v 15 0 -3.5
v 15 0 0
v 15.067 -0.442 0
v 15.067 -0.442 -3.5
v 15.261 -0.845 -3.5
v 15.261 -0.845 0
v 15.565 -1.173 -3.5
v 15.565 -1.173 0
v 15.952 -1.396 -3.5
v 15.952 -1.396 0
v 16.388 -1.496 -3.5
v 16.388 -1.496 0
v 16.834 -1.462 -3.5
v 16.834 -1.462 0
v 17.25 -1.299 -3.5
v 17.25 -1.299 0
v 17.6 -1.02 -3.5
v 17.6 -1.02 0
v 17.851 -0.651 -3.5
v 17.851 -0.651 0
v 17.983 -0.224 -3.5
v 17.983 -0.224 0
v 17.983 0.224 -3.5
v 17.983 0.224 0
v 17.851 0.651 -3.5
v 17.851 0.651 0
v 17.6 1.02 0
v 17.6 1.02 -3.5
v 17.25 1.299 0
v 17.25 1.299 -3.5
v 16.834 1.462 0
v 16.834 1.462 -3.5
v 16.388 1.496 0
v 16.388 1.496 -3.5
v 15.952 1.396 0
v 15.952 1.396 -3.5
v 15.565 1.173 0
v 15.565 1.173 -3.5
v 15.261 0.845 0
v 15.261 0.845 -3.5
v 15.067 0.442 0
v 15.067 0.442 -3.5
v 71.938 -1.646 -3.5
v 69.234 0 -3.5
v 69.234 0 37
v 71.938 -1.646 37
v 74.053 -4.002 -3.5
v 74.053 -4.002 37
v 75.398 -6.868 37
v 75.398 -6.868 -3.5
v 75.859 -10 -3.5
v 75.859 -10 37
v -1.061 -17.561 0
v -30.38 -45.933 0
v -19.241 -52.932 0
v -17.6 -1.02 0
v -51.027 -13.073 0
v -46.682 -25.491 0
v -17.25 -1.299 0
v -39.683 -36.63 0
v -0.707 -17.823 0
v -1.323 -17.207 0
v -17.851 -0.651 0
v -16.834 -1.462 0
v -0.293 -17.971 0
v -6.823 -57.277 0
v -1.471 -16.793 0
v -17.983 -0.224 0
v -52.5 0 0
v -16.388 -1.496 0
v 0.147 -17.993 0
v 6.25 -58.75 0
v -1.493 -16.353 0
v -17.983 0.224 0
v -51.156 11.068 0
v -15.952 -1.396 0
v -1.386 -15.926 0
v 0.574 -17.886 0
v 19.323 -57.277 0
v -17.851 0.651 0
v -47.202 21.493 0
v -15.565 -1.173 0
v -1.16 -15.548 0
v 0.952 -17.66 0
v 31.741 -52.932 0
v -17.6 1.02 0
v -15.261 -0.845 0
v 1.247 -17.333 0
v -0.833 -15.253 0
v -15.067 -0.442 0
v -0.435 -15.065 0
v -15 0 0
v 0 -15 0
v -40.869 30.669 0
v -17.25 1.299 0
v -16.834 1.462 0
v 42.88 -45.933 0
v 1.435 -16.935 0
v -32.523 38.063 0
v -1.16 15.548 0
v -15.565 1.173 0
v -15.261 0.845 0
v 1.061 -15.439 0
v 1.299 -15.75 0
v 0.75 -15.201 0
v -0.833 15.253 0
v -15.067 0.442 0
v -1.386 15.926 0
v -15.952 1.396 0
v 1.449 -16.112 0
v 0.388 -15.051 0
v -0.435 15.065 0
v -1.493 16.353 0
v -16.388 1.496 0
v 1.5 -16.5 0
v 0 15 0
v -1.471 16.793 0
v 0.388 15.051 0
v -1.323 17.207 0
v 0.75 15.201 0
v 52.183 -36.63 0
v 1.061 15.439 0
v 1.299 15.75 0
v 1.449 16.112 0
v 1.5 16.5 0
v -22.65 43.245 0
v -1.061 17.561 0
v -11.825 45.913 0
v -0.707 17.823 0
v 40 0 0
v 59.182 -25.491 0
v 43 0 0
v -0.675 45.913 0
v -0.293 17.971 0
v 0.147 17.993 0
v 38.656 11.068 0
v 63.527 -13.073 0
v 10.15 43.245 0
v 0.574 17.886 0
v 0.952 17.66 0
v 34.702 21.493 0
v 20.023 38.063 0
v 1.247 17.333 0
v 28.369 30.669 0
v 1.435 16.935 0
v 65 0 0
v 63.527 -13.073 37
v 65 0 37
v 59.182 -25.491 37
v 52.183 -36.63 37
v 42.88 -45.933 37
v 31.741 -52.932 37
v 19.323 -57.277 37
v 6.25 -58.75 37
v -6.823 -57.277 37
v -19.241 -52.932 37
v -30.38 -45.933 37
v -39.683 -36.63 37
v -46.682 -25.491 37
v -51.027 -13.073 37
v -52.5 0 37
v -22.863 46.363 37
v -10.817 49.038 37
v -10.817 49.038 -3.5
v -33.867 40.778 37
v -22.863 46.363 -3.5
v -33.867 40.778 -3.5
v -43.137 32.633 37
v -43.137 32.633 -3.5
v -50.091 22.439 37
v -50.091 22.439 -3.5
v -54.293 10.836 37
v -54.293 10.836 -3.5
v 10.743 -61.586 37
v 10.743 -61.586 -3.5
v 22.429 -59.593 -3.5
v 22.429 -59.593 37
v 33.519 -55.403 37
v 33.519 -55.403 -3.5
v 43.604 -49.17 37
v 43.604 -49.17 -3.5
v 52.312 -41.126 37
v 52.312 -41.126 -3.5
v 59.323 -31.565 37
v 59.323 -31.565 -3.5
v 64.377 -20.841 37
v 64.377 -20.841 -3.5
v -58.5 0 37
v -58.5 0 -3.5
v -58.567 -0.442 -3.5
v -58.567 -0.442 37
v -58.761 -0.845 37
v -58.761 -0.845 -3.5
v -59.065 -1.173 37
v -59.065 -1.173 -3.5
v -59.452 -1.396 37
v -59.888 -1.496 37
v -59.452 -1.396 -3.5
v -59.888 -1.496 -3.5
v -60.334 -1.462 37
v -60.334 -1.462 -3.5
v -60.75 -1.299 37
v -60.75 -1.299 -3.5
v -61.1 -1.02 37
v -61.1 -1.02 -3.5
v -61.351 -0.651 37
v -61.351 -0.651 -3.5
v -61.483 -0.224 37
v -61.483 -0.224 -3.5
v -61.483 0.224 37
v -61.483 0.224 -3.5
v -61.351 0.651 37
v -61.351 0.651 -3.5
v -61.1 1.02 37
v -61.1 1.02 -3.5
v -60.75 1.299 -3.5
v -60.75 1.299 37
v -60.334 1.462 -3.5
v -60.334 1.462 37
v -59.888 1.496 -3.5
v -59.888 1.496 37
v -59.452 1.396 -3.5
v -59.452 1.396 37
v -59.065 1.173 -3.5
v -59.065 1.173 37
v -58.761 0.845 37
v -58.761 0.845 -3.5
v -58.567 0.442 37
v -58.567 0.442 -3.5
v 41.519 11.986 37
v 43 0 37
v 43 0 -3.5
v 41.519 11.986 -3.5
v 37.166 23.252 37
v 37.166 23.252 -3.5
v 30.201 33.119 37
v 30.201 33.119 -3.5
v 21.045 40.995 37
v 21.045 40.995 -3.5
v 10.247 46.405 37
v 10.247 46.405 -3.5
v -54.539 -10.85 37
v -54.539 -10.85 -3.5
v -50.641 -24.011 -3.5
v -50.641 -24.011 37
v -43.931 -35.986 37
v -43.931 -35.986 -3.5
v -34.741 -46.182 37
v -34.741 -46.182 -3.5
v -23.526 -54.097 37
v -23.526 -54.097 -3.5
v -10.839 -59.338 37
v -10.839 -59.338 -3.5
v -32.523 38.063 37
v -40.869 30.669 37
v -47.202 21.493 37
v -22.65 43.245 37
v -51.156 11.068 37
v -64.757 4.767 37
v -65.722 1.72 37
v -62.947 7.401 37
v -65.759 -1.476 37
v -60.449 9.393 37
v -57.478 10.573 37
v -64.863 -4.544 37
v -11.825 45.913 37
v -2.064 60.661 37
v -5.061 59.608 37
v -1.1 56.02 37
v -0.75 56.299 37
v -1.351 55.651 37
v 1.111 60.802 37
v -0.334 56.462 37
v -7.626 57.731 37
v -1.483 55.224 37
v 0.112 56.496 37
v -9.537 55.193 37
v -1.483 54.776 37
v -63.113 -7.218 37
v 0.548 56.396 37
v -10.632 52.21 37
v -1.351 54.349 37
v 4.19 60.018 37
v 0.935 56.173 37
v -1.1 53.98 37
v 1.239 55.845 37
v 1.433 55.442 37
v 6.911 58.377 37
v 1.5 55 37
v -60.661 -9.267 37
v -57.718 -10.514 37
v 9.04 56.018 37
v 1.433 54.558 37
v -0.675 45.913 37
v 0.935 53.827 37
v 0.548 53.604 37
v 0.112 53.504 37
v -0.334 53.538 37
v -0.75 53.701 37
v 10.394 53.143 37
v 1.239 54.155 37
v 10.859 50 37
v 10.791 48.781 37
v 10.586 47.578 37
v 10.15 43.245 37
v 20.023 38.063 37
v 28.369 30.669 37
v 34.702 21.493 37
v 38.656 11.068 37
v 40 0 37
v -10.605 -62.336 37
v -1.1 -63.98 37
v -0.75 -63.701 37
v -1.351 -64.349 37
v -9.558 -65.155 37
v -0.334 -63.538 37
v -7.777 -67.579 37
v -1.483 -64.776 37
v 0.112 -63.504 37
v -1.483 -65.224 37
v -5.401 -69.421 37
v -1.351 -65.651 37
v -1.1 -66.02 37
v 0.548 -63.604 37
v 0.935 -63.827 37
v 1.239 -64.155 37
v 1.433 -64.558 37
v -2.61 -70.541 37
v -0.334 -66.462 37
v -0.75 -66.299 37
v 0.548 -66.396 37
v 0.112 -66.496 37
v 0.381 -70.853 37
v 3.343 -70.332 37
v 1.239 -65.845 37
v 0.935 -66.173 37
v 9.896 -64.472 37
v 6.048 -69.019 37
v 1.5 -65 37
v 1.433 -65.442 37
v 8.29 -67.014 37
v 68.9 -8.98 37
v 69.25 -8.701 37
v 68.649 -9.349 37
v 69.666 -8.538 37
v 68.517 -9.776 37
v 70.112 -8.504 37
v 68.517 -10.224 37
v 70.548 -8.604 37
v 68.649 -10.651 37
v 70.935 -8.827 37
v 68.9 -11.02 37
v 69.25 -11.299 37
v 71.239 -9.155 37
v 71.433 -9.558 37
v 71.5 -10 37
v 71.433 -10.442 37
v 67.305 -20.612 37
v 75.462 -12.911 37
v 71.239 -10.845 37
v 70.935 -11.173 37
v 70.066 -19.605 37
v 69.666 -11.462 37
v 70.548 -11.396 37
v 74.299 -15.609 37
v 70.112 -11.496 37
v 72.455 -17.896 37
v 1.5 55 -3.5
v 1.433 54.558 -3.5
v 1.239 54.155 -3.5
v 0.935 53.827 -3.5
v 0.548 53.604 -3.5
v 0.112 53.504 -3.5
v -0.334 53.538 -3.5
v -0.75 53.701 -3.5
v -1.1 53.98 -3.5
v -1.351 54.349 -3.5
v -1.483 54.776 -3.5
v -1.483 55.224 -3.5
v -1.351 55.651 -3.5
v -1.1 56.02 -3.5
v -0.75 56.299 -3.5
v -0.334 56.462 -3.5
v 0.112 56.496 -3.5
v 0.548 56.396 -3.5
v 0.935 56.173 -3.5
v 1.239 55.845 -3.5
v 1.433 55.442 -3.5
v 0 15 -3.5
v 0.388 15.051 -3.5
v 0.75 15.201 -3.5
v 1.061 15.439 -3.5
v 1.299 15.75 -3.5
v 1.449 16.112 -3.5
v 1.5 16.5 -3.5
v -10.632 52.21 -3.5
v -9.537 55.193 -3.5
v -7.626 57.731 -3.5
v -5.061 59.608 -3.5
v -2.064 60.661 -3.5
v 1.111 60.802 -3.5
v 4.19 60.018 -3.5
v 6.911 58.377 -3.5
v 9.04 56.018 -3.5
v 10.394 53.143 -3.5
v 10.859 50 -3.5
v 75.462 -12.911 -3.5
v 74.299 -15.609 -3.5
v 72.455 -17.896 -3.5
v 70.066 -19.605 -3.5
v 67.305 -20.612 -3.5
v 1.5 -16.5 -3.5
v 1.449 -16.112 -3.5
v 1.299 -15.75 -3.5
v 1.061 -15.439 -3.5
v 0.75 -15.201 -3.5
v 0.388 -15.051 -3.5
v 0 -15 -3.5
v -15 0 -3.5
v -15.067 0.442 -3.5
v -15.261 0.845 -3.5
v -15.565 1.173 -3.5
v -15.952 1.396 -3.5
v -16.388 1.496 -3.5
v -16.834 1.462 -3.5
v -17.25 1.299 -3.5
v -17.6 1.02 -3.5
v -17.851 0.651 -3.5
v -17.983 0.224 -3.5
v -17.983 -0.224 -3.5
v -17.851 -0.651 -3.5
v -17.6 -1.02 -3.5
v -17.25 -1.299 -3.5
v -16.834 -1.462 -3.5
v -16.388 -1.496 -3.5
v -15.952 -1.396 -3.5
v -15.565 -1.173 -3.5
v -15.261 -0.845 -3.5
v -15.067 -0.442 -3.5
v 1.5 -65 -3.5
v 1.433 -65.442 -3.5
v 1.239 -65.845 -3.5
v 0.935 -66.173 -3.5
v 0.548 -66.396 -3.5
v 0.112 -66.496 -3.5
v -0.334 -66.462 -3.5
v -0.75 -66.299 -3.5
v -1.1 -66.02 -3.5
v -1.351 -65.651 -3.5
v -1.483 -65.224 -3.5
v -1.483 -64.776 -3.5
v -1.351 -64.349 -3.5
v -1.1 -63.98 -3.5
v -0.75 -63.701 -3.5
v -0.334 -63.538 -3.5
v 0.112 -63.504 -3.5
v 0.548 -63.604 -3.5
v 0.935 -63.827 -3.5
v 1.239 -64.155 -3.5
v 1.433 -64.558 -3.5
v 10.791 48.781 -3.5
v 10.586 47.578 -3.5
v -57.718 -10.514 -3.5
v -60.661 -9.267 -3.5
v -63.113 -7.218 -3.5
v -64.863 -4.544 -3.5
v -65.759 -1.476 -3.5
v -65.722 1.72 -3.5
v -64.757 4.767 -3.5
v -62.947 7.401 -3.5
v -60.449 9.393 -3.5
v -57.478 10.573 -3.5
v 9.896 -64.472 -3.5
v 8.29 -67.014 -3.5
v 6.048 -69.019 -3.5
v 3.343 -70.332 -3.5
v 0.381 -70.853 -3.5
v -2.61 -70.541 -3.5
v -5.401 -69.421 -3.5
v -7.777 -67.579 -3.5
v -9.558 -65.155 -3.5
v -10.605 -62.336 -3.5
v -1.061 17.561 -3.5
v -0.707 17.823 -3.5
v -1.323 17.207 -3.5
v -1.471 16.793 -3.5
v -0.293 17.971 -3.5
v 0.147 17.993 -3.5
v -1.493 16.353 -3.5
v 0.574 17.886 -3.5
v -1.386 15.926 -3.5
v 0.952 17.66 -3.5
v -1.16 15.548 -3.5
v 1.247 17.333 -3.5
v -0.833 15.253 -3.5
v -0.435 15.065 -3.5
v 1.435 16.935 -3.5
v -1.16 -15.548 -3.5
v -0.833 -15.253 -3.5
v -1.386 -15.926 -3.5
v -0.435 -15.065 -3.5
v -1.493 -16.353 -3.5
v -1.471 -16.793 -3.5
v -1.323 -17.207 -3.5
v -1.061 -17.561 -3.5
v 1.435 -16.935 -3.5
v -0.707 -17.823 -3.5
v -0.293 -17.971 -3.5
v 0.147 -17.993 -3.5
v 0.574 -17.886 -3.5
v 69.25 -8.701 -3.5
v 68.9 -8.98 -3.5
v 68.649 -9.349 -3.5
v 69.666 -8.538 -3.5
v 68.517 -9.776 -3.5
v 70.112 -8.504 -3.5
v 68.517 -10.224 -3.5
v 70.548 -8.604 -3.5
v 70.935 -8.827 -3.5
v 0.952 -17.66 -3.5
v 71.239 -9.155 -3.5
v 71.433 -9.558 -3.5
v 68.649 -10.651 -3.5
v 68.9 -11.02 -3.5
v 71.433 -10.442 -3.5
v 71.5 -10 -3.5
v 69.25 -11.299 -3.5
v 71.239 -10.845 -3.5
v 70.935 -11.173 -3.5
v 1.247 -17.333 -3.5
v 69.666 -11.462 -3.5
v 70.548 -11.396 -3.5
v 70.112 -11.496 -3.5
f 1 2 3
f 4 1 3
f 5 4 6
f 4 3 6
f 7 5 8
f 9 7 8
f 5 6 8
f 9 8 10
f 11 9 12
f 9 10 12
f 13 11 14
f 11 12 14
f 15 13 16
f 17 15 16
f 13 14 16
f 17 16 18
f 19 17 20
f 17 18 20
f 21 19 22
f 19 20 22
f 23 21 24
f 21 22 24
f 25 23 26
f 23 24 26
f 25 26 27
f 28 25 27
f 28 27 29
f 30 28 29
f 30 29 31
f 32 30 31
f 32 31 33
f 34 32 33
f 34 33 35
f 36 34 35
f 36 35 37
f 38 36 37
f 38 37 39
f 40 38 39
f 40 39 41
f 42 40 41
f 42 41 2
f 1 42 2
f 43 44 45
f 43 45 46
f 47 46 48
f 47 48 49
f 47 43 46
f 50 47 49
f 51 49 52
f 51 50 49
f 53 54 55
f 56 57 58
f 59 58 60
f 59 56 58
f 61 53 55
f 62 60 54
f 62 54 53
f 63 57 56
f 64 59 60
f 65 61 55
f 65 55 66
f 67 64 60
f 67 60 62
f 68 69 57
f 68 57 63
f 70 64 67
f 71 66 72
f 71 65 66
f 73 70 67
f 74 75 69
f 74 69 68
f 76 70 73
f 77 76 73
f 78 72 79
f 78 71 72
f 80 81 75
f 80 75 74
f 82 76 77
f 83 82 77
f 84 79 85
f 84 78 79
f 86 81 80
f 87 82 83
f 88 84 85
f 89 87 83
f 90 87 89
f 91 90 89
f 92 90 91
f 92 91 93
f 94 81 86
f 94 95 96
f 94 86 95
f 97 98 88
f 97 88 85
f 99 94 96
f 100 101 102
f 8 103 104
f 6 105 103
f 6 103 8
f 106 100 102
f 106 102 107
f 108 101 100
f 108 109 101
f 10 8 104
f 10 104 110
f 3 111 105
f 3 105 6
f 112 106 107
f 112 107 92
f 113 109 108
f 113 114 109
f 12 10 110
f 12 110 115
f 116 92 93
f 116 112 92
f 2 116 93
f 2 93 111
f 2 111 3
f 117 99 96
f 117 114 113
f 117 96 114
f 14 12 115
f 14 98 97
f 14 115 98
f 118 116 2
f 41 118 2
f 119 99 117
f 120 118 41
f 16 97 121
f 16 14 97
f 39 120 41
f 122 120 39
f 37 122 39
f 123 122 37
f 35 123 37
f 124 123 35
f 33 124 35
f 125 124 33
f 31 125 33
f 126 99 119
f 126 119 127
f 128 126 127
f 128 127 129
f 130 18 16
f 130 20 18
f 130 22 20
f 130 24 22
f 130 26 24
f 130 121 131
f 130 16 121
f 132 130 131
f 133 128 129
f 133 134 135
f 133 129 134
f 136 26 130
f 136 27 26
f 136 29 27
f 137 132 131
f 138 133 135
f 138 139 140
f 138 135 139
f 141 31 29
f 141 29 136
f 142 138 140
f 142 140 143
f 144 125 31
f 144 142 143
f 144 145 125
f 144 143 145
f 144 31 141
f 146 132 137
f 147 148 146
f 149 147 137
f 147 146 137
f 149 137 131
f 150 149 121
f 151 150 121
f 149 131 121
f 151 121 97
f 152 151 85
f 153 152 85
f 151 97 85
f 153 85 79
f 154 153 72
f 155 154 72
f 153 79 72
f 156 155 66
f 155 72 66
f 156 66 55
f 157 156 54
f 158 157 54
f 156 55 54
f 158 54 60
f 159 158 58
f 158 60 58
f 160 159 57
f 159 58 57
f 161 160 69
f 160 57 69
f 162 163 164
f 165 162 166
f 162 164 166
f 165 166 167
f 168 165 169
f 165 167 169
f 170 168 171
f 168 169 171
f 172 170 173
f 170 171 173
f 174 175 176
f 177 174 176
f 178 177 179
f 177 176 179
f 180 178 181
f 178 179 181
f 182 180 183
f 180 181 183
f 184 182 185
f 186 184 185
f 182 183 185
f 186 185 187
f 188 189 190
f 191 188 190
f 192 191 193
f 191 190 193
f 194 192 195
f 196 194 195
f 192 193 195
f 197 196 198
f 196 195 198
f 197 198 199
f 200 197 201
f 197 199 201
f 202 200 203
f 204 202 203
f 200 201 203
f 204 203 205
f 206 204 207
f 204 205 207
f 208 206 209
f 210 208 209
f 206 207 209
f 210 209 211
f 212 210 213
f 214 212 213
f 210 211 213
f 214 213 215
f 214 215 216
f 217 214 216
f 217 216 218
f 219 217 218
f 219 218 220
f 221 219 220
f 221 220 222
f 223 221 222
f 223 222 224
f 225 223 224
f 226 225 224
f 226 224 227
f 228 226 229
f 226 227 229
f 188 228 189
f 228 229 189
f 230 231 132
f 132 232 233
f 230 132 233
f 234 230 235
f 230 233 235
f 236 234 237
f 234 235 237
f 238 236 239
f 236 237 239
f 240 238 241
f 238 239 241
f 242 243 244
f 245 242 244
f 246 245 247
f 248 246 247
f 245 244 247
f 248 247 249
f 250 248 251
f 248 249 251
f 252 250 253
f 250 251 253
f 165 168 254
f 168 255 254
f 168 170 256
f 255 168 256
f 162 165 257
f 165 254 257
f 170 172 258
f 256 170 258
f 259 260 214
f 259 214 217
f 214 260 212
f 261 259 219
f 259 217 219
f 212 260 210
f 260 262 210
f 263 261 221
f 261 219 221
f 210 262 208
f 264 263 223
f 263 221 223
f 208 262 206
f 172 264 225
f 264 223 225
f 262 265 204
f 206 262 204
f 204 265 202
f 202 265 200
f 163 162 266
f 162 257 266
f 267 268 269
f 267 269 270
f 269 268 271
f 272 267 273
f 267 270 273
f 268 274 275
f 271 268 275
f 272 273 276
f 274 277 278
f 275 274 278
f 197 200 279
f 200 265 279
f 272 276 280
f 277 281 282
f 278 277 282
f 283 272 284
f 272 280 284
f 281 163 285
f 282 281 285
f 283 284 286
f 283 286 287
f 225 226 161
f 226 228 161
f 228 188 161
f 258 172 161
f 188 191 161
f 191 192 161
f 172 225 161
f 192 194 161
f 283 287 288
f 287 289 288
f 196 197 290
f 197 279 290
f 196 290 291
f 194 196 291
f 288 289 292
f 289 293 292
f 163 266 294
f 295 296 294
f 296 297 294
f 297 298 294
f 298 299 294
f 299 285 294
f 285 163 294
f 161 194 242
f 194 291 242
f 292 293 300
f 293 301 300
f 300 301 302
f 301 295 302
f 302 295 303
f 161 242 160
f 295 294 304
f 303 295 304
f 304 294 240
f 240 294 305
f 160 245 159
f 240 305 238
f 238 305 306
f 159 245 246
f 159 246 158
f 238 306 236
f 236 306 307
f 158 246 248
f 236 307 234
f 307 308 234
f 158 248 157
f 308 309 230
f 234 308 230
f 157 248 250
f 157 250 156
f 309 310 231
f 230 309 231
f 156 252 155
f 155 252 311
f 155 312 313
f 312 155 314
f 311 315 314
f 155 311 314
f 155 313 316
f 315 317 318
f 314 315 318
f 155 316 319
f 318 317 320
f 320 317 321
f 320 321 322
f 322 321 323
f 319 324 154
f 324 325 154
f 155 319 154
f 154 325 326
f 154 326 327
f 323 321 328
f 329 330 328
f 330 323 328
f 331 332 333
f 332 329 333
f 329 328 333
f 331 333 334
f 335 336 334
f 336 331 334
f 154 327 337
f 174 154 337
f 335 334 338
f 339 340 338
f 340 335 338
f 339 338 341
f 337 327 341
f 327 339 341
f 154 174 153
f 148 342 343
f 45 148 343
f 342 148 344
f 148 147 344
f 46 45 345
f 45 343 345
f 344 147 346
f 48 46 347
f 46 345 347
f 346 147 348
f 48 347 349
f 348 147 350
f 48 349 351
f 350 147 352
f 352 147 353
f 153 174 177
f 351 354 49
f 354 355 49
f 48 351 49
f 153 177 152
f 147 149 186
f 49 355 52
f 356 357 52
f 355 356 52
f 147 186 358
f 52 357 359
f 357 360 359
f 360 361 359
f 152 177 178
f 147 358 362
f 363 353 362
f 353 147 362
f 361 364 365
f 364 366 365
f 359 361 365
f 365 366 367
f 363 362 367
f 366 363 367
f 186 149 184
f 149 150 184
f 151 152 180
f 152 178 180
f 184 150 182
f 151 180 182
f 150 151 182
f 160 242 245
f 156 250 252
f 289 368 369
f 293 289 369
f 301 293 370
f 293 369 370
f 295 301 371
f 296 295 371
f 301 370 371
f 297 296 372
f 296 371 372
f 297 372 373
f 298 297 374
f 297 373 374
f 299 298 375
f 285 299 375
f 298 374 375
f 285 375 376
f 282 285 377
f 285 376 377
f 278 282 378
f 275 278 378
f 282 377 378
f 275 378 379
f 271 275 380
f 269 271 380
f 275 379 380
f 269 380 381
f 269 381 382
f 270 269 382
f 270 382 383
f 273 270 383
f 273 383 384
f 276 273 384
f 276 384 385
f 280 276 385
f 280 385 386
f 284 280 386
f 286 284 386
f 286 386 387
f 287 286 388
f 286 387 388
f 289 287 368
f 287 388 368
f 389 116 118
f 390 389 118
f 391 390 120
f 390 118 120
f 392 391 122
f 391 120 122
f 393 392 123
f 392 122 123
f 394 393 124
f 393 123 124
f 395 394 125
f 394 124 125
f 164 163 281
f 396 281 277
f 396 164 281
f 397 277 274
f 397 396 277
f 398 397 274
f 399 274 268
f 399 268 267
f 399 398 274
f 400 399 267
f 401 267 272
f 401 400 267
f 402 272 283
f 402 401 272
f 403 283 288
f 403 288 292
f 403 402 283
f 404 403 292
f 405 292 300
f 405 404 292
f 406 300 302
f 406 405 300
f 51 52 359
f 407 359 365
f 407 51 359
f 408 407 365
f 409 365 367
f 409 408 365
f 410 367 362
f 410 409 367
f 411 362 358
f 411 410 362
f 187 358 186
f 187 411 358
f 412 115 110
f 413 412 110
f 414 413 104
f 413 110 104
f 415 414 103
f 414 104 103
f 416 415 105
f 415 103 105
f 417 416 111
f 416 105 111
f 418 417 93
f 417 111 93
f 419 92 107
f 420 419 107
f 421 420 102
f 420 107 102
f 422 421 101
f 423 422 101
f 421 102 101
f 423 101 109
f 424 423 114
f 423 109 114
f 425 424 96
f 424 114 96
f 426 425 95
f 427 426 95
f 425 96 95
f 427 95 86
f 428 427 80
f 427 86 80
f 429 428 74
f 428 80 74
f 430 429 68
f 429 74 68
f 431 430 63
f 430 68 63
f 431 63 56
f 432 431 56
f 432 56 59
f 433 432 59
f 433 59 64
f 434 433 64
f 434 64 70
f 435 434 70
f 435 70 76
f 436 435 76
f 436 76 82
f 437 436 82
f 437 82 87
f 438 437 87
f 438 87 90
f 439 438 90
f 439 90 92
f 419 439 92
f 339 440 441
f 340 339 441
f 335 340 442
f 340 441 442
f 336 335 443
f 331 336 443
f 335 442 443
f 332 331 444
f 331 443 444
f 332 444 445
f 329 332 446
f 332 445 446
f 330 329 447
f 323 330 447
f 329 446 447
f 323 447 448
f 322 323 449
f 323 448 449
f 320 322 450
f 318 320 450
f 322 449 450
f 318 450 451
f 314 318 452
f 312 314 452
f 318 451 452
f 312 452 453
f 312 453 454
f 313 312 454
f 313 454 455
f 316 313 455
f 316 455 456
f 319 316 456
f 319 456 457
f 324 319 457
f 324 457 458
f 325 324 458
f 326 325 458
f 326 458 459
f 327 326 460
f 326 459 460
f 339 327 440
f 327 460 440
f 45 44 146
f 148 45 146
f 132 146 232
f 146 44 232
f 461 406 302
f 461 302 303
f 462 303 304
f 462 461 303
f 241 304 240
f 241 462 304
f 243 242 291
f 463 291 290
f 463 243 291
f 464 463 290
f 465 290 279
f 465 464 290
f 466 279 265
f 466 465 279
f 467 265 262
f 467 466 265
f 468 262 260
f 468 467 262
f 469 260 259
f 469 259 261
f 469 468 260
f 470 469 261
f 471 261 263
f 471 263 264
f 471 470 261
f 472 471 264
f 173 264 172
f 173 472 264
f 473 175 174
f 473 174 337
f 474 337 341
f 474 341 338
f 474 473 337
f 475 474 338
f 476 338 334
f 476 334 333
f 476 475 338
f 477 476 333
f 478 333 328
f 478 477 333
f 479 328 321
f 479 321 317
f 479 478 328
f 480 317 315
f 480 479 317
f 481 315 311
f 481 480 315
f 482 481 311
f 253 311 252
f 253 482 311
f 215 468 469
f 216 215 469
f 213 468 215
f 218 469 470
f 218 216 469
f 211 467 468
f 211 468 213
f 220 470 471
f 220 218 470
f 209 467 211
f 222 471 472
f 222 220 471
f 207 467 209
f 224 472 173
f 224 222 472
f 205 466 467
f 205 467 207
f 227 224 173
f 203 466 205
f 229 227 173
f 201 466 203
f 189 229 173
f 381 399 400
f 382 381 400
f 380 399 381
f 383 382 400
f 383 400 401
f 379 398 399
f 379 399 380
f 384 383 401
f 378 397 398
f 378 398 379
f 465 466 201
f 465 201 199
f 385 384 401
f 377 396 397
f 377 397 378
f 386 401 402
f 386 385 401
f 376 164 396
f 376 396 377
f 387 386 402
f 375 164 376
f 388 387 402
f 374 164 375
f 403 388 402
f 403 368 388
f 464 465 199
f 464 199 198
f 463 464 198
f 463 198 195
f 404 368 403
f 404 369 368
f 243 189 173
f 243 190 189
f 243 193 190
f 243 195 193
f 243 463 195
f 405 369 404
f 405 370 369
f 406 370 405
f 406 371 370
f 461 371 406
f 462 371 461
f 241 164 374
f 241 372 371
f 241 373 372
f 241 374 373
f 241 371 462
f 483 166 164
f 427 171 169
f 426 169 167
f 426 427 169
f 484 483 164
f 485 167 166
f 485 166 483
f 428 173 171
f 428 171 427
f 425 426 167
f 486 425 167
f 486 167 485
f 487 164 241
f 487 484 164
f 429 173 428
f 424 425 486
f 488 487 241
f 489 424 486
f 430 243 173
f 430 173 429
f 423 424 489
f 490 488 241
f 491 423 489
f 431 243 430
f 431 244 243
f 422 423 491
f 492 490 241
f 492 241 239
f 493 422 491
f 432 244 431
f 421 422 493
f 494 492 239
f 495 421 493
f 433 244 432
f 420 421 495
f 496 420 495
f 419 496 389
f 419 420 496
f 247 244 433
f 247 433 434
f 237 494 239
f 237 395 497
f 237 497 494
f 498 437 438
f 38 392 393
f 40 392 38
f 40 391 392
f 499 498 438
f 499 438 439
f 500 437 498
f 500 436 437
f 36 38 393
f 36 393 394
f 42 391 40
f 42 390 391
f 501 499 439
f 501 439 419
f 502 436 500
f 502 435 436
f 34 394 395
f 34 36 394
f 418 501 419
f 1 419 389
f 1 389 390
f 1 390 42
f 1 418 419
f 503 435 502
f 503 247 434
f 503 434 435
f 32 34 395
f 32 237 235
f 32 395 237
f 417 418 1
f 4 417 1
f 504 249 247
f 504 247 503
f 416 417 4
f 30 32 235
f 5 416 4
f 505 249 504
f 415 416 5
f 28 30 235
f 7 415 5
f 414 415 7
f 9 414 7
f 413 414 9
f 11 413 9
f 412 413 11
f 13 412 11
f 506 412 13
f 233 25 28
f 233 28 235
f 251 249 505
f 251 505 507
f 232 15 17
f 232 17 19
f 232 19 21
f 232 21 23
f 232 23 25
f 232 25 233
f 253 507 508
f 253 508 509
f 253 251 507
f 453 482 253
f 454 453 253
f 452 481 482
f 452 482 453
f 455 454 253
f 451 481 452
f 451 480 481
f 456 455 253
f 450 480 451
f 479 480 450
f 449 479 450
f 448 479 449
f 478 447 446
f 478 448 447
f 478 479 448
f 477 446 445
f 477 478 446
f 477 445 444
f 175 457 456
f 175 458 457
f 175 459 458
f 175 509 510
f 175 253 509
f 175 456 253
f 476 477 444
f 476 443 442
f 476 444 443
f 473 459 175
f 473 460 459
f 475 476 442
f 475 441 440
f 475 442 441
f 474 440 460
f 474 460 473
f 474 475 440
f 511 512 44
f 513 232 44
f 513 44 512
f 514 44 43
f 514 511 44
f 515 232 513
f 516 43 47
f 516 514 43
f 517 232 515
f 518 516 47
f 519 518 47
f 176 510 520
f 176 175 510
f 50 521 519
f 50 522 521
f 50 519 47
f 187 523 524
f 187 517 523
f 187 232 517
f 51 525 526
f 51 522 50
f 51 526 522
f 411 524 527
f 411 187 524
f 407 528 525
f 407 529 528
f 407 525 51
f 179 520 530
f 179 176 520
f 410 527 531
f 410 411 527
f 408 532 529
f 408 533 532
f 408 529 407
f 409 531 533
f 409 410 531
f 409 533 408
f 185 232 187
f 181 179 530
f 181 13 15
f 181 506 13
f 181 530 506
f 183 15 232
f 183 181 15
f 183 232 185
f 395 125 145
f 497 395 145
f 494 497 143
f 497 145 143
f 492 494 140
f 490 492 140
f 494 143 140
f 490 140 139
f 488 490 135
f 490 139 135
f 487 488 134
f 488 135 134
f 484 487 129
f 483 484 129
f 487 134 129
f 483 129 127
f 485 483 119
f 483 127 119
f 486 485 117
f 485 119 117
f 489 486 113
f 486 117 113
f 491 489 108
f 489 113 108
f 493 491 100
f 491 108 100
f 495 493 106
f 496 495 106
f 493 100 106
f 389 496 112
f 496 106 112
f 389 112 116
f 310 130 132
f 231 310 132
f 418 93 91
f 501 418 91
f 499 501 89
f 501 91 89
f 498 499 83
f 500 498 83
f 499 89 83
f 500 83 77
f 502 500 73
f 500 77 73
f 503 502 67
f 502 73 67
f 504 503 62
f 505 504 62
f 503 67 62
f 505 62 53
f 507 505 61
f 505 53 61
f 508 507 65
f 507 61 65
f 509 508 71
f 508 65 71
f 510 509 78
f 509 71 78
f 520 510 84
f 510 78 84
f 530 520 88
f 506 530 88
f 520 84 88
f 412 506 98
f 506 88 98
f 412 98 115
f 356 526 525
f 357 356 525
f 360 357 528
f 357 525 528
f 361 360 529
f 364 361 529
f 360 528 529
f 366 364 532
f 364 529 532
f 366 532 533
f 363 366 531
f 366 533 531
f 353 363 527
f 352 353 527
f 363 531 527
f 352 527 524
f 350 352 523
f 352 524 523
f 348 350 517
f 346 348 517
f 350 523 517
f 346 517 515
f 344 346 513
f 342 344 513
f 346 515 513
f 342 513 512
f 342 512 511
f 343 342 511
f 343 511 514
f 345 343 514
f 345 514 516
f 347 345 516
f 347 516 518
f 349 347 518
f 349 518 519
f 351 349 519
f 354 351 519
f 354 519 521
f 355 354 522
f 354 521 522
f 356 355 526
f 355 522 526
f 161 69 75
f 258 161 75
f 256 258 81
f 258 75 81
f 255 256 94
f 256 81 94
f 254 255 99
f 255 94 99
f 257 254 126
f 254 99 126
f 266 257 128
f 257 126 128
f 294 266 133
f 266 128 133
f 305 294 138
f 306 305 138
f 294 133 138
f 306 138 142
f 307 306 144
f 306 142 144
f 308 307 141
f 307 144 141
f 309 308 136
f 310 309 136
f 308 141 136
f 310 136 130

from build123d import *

# Parameters (mm, degrees)
F0_R     = 40
F1_DEPTH = 3.5
F2_DEPTH = 37
F3_R     = 1.5
F4_DEPTH = 25
F5_R     = 1.5
F6_DEPTH = 40.5


with BuildPart() as f1:
    # F0 (on Top) → F1 (new body)
    with BuildSketch(Plane.XY):
        with BuildLine():
            Line((43, 0), (40, 0))
            ThreePointArc((40, 0), (-6.25, 46.25), (-52.5, 0))
            ThreePointArc((-52.5, 0), (6.25, -58.75), (65, 0))
            Line((65, 0), (43, 0))
        make_face()
        Circle(F0_R, mode=Mode.SUBTRACT)
        Circle(F0_R)
        with BuildLine():
            ThreePointArc((-52.5, 0), (-6.25, 46.25), (40, 0))
            Line((40, 0), (43, 0))
            ThreePointArc((43, 0), (-6.25, 49.25), (-55.5, 0))
            ThreePointArc((-55.5, 0), (6.25, -61.75), (68, 0))
            Line((68, 0), (65, 0))
            ThreePointArc((65, 0), (6.25, -58.75), (-52.5, 0))
        make_face()
    extrude(amount=-F1_DEPTH)

    # F0 (on Top) → F2 (join)
    with BuildSketch(Plane.XY):
        with BuildLine():
            ThreePointArc((-52.5, 0), (-6.25, 46.25), (40, 0))
            Line((40, 0), (43, 0))
            ThreePointArc((43, 0), (-6.25, 49.25), (-55.5, 0))
            ThreePointArc((-55.5, 0), (6.25, -61.75), (68, 0))
            Line((68, 0), (65, 0))
            ThreePointArc((65, 0), (6.25, -58.75), (-52.5, 0))
        make_face()
    extrude(amount=F2_DEPTH)

    # F3 (on face) → F4 (cut)
    with BuildSketch(Plane.XY):
        with BuildLine():
            ThreePointArc((1.5, 16.5), (-1.0606601718, 17.5606601718), (0, 15))
            ThreePointArc((0, 15), (1.0606601718, 15.4393398282), (1.5, 16.5))
        make_face()
        with BuildLine():
            ThreePointArc((18, 0), (16.5, 1.5), (15, 0))
            ThreePointArc((15, 0), (16.5, -1.5), (18, 0))
        make_face()
        with BuildLine():
            ThreePointArc((1.5, -16.5), (1.0606601718, -15.4393398282), (0, -15))
            ThreePointArc((0, -15), (-1.0606601718, -17.5606601718), (1.5, -16.5))
        make_face()
        with Locations((-16.5, 0)):
            Circle(F3_R)
    extrude(amount=-F4_DEPTH, mode=Mode.SUBTRACT)

    # F5 (on face) → F6 (join)
    with BuildSketch(Plane(origin=(0, 0, -3.5), x_dir=(1, 0, 0), z_dir=(0, 0, -1))):
        with BuildLine():
            ThreePointArc((10.7428359613, 61.5863371619), (-1.1250923825, 70.8008868716), (-10.8391434064, 59.3382143111))
            ThreePointArc((-10.8391434064, 59.3382143111), (-0.147675703, 61.417686749), (10.7428359613, 61.5863371619))
        make_face()
        with Locations((0, 65)):
            Circle(F5_R, mode=Mode.SUBTRACT)
        with BuildLine():
            ThreePointArc((-55.5, 0), (-55.2593781422, 5.4459985826), (-54.5393878361, 10.8495542082))
            ThreePointArc((-54.5393878361, 10.8495542082), (-65.8586269328, -0.1233337651), (-54.2930770248, -10.8362931849))
            ThreePointArc((-54.2930770248, -10.8362931849), (-55.1973392713, -5.4516491325), (-55.5, 0))
        make_face()
        with Locations((-60, 0)):
            Circle(F5_R, mode=Mode.SUBTRACT)
        with BuildLine():
            ThreePointArc((10.2469559678, -46.4048806032), (-0.1412893215, -48.8696854281), (-10.8166174818, -49.0378272844))
            ThreePointArc((-10.8166174818, -49.0378272844), (-0.481560086, -60.8486446142), (10.859327331, -50))
            ThreePointArc((10.859327331, -50), (10.7051398656, -48.1765498249), (10.2469559678, -46.4048806032))
        make_face()
        with Locations((0, -55)):
            Circle(F5_R, mode=Mode.SUBTRACT)
        with BuildLine():
            ThreePointArc((75.859327331, 10), (72.4550295609, 17.8960448535), (64.3765674089, 20.8414169686))
            ThreePointArc((64.3765674089, 20.8414169686), (67.0873981918, 10.5770261061), (68, 0))
            Line((68, 0), (69.2337914548, 0))
            ThreePointArc((69.2337914548, 0), (74.0526547858, 4.0021310941), (75.859327331, 10))
        make_face()
        with Locations((70, 10)):
            Circle(F5_R, mode=Mode.SUBTRACT)
    extrude(amount=-F6_DEPTH)


solid = f1.part
